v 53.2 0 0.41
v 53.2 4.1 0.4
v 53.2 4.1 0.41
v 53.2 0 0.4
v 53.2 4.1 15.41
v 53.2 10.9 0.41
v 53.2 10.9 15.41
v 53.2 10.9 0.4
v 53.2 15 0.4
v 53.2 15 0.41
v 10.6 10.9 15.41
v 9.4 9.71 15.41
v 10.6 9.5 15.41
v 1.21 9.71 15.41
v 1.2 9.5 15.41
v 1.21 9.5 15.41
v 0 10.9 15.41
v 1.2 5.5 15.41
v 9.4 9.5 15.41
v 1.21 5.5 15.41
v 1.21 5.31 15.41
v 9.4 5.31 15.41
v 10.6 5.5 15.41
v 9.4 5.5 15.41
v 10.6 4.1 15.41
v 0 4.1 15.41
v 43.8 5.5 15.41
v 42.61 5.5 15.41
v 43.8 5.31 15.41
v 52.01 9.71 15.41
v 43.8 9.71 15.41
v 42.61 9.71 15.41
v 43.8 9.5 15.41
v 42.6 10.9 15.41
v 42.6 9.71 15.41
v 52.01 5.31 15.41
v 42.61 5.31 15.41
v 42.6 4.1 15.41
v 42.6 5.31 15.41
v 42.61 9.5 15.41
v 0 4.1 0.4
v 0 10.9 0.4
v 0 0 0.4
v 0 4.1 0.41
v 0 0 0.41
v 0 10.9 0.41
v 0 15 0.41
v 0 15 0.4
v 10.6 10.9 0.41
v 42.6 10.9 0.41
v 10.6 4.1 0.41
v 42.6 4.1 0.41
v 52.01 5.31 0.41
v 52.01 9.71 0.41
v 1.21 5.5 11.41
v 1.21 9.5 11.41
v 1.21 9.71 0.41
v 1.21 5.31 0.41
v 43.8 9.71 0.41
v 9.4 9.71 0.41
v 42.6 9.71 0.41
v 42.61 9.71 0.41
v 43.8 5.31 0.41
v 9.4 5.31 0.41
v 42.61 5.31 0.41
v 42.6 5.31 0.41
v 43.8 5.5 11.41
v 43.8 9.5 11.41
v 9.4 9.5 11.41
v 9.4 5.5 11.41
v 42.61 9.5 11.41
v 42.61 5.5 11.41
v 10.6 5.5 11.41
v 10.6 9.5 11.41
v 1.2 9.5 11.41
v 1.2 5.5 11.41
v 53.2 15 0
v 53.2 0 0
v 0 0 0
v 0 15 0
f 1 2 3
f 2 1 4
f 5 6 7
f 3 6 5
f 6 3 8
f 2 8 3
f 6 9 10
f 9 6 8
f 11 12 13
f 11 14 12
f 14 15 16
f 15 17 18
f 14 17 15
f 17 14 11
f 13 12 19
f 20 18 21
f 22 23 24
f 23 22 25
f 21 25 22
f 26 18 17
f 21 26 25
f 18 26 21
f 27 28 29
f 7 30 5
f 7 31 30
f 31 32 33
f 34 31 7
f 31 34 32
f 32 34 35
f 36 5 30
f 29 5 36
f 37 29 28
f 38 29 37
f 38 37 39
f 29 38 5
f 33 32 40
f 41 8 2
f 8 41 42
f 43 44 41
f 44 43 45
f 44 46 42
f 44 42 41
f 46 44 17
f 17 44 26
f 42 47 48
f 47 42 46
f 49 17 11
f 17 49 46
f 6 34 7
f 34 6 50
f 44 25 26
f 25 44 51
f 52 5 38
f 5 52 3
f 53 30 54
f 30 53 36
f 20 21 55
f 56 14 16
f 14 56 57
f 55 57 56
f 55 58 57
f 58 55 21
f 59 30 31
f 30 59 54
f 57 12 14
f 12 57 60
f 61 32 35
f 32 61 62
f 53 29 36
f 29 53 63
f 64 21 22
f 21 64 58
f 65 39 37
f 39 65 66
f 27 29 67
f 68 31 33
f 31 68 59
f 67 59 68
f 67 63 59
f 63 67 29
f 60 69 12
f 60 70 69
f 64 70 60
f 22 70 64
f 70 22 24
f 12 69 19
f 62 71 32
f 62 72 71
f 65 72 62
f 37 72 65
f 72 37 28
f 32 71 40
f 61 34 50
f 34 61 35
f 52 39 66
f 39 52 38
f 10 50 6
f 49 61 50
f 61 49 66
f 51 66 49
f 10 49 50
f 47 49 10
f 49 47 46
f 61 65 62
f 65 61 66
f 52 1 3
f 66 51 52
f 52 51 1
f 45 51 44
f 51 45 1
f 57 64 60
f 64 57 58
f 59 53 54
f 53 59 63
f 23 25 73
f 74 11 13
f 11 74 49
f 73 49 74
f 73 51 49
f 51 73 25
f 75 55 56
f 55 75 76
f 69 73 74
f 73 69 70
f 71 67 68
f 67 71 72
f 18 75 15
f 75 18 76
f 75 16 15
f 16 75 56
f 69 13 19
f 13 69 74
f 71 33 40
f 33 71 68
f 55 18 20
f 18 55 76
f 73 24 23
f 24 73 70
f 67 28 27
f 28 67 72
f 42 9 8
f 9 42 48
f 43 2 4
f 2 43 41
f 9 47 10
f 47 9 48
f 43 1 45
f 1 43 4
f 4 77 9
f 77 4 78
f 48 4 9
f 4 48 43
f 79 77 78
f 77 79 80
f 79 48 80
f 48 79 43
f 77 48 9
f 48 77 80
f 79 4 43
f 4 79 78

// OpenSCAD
// file: ../../Base/PlacementOptions.scad
// Fischertechnik Box Foundation
// Placement Options

// Alignment
NoAlign = 0;
AlignLeft = 1;
AlignBottom = 2;
AlignCenter = 3;
AlignRight = 4;
AlignTop = 5;

// Element rotation degree steps
rotations = [0, -90, -180, -270];

// Rotation
NoRotation = 0;
Rotate0 = 0;
Rotate90 = 1;
Rotate180 = 2;
Rotate270 = 3;

// Docking (seen from above)
NoDock = -1;
DockLeft = 0;
DockTop = 1;
DockRight = 2;
DockCorner = 2;
DockBottom = 3;

// Web corners
LowerLeft = 0;
UpperLeft = 1;
UpperRight = 2;
LowerRight = 3;

// Web position relative to corner
LeftOfCorner = 0;
RightOfCorner = 1;
// file: ../../Base/Boxes.scad
// Fischertechnik Box Foundation
// Pre-designed Boxes

use <Constants.scad>

include <PlacementOptions.scad>

box190Width = 190;
box190Depth = 130;
box130Width = 130;
box130Depth = 95;

// Values are from an original ec3 box
topBottomDifference = 1.5;
outerHeight = 40;
baseThickness = 1.8;
innerHeight = outerHeight - baseThickness;
stackExcess = 5.7;
radius = 3.5;
wallThickness = 1.5;
tolerance = 0.2;

boxWallThickness = wallThickness;
boxBaseThickness = baseThickness;
boxWebWidth = 3.0;

// getBoxWallThickness()
// Gets the wall thickness of a Fischertechnik Box
function getBoxWallThickness() = boxWallThickness;

// getBoxUsageHeight(height = 38.2)
// Gets the usable height of a Fischertechnik box
// height = Outer height of the box from the bottom to the upper edge.
function getBoxUsageHeight(height = outerHeight) = height - baseThickness - stackExcess;

// getBoxInnerHeight()
// Gets the inner height of a Fischertechnik box, including the stack excess
function getBoxInnerHeight() = innerHeight;

// getBoxBaseThickness()
// Gets the thickness of the Fischertechnik box base.
function getBoxBaseThickness() = boxBaseThickness;

// getBoxWebWidth()
// Gets the width of a box web
function getBoxWebWidth() = boxWebWidth;

// getBox190Space()
// Gets the usable inner space of a Box 190 as an x/y-list
function getBox190Space() = [
    box190Width - 2*getBoxWallThickness() - topBottomDifference, 
    box190Depth - 2*getBoxWallThickness() - topBottomDifference ];

// RoundedCornerPlate(width, depth, height, radius)
// Creates a body plate with rounded corners for a box. Used
// also to create the complete box with the hull module.
// width = Width of the plate
// depth = depth of the plate 
// height = thickness of the plate
// radius = radius of the rounded corner
module RoundedCornerPlate(width, depth, height, radius) {
    translate([radius, radius])
    hull() {
        w = width-2*radius;
        d = depth-2*radius;
        cube([w, d, height]);
        cylinder(height, r=radius, $fn=getFragments());
        translate([w, 0])
            cylinder(height, r=radius, $fn=getFragments());
        translate([w, d])
            cylinder(height, r=radius, $fn=getFragments());
        translate([0, d])
            cylinder(height, r=radius, $fn=getFragments());
    }
}

// BoxBase(width, depth)
// Creates an empty stackable Fischertechnik compatible box
// width = Outer width of the box (190, 130, ...)
// depth = Outer depth of the box (130, 95, ...)

module BoxBase(width, depth, height=outerHeight) {    
    thinPlate = 0.01;

    innerHeight = height - baseThickness;    
    
    module Body(tolerance=tolerance) {
        hull() {
            // Bottom with tolerance to fit into the original boxes when stacked
            translate([-wallThickness+tolerance, -wallThickness+tolerance, -baseThickness])
                RoundedCornerPlate(width-topBottomDifference-2*tolerance, depth-topBottomDifference-2*tolerance, thinPlate, radius);
            
            // Top
            translate([-wallThickness-topBottomDifference/2, -wallThickness-topBottomDifference/2, innerHeight-thinPlate])
                RoundedCornerPlate(width, depth, thinPlate, radius);
         }
    }

    module Cutoff() {
        hull() {
            coWidth = width - 2*wallThickness;
            coDepth = depth - 2*wallThickness;
            
            // Bottom
            RoundedCornerPlate(coWidth-topBottomDifference, coDepth-topBottomDifference, thinPlate, radius);

            // Top
            translate([-topBottomDifference/2, -topBottomDifference/2, innerHeight+thinPlate]) 
                RoundedCornerPlate(coWidth, coDepth, thinPlate, radius);
        }
    }
    
    difference() {        
        Body();
        Cutoff();
        stackOffset = innerHeight - stackExcess;
        translate([0, 0, stackOffset + baseThickness])
            Body(tolerance=0);
    }
}

// Creates the Fischertechnik empty box 130x190 mm and places it at position 0,0
// 190x130 are the outer sizes, the inner space is slightly smaller. Use getBox190Space() to get the inner sizes.
// The box is positioned that the usable inner space is at the 0,0,0 position.

module Box190() {
    BoxBase(box190Width, box190Depth);
}

// Gets the usable inner space of a Box 130 as an x/y-list
function getBox130Space() = [
    box130Width - 2*getBoxWallThickness() - topBottomDifference, 
    box130Depth - 2*getBoxWallThickness() - topBottomDifference ];

// Creates the Fischertechnik empty box 95x130 mm and places it at position 0,0
// 190x130 are the outer sizes, the inner space is slightly smaller. Use getBox190Space() to get the inner sizes.
// The box is positioned that the usable inner space is at the 0,0,0 position.

module Box130() {
    BoxBase(box130Width, box130Depth);
}

// Creates a web at the specified box walls
// corner 0 = LowerLeft, 1 = UpperLeft, 2 = UpperRight, 3 = LowerRight
// side 0 = LeftOfCorner, 1 = RightOfCorner
// distance = Distance in mm from the corner
// boxSpace = inner width and depth of the box (default: Box 190)
// webWidth = length of the web (default is 3 mms)
// webThickness = thickness of the web (default is 1 mm)
// height = Height of the web (standard is getBoxUsageHeight())

module BoxWeb(corner, side, distance, boxSpace=getBox190Space(), webWidth=getBoxWebWidth(), webThickness=1.0, height=getBoxUsageHeight()) {
    sink = getBoxWallThickness()/2;

    width = (corner % 2 == 0) ? 
            (side == LeftOfCorner ? webWidth : webThickness) :
            (side == LeftOfCorner ? webThickness : webWidth);

    depth = (corner % 2 == 0) ? 
            (side == RightOfCorner ? webWidth : webThickness) :
            (side == RightOfCorner ? webThickness : webWidth);
    
    xDiff = corner == LowerLeft ? 
                (side == LeftOfCorner ? -sink : distance) :
            (corner == UpperLeft ?                
                (side == LeftOfCorner ? distance : -sink) :
            (corner == UpperRight ?
                (side == LeftOfCorner ? boxSpace.x-webWidth+sink : boxSpace.x-distance-webThickness) :
                (side == LeftOfCorner ? boxSpace.x-distance-webThickness: boxSpace.x-webWidth+sink)));

    yDiff = corner == LowerLeft ? 
                (side == RightOfCorner ? -sink : distance) :
            (corner == UpperLeft ?
                (side == RightOfCorner ? boxSpace.y-distance-webThickness : boxSpace.y-webWidth+sink) :
            (corner == UpperRight ?
                (side == RightOfCorner ? boxSpace.y-webWidth+sink : boxSpace.y-distance-webThickness) :
                (side == RightOfCorner ? distance : -sink)));
    
    translate([xDiff, yDiff, -getExcess()])
        cube([width, depth, height + 2*getExcess()]);
}
// file: ../../Base/Rotation.scad
// Fischertechnik Box Foundation
// Geometry Helpers Rotation

include <PlacementOptions.scad>

// getRotatedSpace(space, rotation=NoRotation)
// Rotates the space dependent on the specified rotation

function getRotatedSpace(space, rotation=NoRotation) = [
    (rotation == Rotate90 || rotation == Rotate270) ? space.y : space.x,
    (rotation == Rotate90 || rotation == Rotate270) ? space.x : space.y
];

// Rotates the given space around the fixed left lower corner
// space = the space the children needs as width/depth list [width,depth]
// rotation = 0 Rotate0 degrees, 1 Rotate90 degrees, 2 Rotate180 degrees, 3 Rotate270 degrees (equivalent to -90)

module RotateFix(space, rotation=NoRotation) {
    dy = (rotation == Rotate0 || rotation == Rotate270) ? 0 :
        (rotation == Rotate90) ? space.x :
        space.y;
    dx = (rotation < Rotate180) ? 0 :
        (rotation == Rotate180) ? space.x :
        space.y;
    
    translate([dx, dy, 0])
        rotate([0, 0, rotations[rotation]])
            children();
}
// file: ../../Base/Alignment.scad
// Fischertechnik Box Foundation
// Geometry Helpers Alignment

include <PlacementOptions.scad>

// getAlignedX(elementWidth, spaceWidth, align=AlignRight, offset=0)
// Gets the aligned X offset of an element with the given
// width in the given space.
// elementWidth = The width of the element to positon
// spaceWidth = The space where the element should be aligned
// align = 0 AlignLeft, 1 AlignCenter, 2 AlignRight
// offset = an optional offset from the aligned position. When
// aligned left or centered, then positive values are in X direction.
// When aligned right then positive values are in negative X direction.

function getAlignedX(elementWidth, spaceWidth, align=AlignRight, offset=0) =
    (align == AlignLeft) ?
        offset :
        ((align == AlignCenter) ?
        (spaceWidth - elementWidth)/2 + offset :
        spaceWidth - offset - elementWidth);

// getAlignedY(elementDepth, spaceDepth, align=AlignTop, offset=0)
// Gets the aligned Y offset of an element with the given
// depth in the given space.
// elementDepth = The depth of the element to positon
// spaceDepth = The space where the element should be aligned
// align = 0 AlignBottom, 1 AlignCenter, 2 AlignTop
// offset = an optional offset from the aligned position. When
// aligned bottom or centered, then positive values are in Y direction.
// When aligned top then positive values are in negative Y direction.

function getAlignedY(elementDepth, spaceDepth, align=AlignTop, offset=0) =
    (align == AlignBottom) ?
        offset :
        ((align == AlignCenter) ?
        (spaceDepth - elementDepth)/2 + offset :
        spaceDepth - offset - elementDepth);
// file: ../../Elements/FrameAxis50.scad
// Fischertechnik Box Library
// Frame for single 50 mm Axis
// 31033

use <../ModelBase/Complex.scad>

length = 50;

// getFrameAxis50Space()
// Gets the width (.x) and depth (.y) of the axis frame.

function getFrameAxis50Space() = getFrameAxisSpace(length);

// FrameAxis50()
// Axis holder for a single 50 mm axis.

module FrameAxis50() {
    FrameAxis(length);
}

// Test
color("lightgray")
FrameAxis50();
// file: ../../Base/Placement.scad
// Fischertechnik Box Foundation
// Geometry Helpers Placement

use <Constants.scad>
use <Alignment.scad>
use <Rotation.scad>
use <Boxes.scad>

include <PlacementOptions.scad>

// Place(x=0, y=0, elementSpace=[0,0], alignX=AlignLeft, alignY=AlignBottom, rotation=Rotate0, boxSpace=getBox190Space())
// Places the child at the specified position
// y = Y-Position. This is a relative position when an X aligment is specified.
// x = X-Position. This is a relative position when an Y aligment is specified.
// elementSpace = space of the element to be placed [x,y]
// alignX = -1=NoAlign, 0 AlignLeft, 1 AlignCenter, 3 AlignRight (elementSpace and boxSpace required!)
// alignY = -1=NoAlign, 2 AlignBottom, 1 AlignCenter, 4 AlignTop (elementSpace and boxSpace required!)
// rotation = 0 Rotate0 0 degrees, 1 Rotate90 90 degrees, 
// 2 Rotate180 180 degrees, 3 Rotate270 270 degrees (equivalent to -90)
// boxSpace = Inner space of the box where the placement occurs [x,y] - default is Box 190x130 inner space

module Place(x=0, y=0, elementSpace=[0,0], 
  alignX=AlignLeft, alignY=AlignBottom, 
  rotation=NoRotation, boxSpace=getBox190Space()) {

    module Position(x, y, space, rotation=Rotate0) {
        translate([x, y, 0])
            RotateFix(space, rotation)
                children();
    }

    space = getRotatedSpace(elementSpace, rotation);
    alignedX = getAlignedX(space.x, boxSpace.x, alignX, x);
    alignedY = getAlignedY(space.y, boxSpace.y, alignY, y);
    Position(alignedX, alignedY, elementSpace, rotation)
        children();
}

// Center(space=getBox130Space(), elementSpace=[0,0])
// space = Space where the children is centered. For cylinder use centered=true and no elementSpace.
// elementSpace = space of the element to be centered [x,y]

module Center(space=getBox190Space(), elementSpace=[0,0]) {
    Place(elementSpace=elementSpace, boxSpace=space, alignX=AlignCenter, alignY=AlignCenter)
        children();
}

// CenterHorizontal(width=0, y=0, offset=0, space=getBox130Space())
// width = Width of the element to be placed.
// y = Y position of the element
// offset = Offset from the center position (negative will be left of the center)
// space = Space where the element is placed

module CenterHorizontal(width=0, y=0, offset=0, space=getBox190Space()) {
    Place(x=offset, y=y, elementSpace=[width, 0], boxSpace=space, alignX=AlignCenter)
        children(0);
}

// CenterVertical(depth=0, x=0, offset=0, space=getBox130Space())
// depth = Depth of the element to be placed.
// x = X position of the element
// offset = Offset from the center position (negative will be down of the center)
// space = Space where the element is placed

module CenterVertical(depth=0, x=0, offset=0, space=getBox190Space()) {
    Place(x=x, y=offset, elementSpace=[0, depth], boxSpace=space, alignY=AlignCenter)
        children(0);
}

// getIsVertical(align)
// True if the specified alignment needs a vertical orientation for a divider (AlignRight, AlignLeft)

function getIsVertical(align) = (align == AlignRight || align == AlignLeft);

// getIsHorizontal(align)
// True if the specified alignment needs a horizontal orientation for a divider (AlignTop, AlignBottom)

function getIsHorizontal(align) = (align == AlignTop || align == AlignBottom);
// file: ../../Elements/AxisClip10.scad
// Fischertechnik Box Library
// Axis for clip 10
// 31023

use <../ModelBase/Simple.scad>
use <../Base/Constants.scad>

/* [Element Parameters] */
height = 23;
clipHeight = 10;

/* [Hidden] */
width = 12;
depth = 12;
upperDiameter = 3.6;

// getAxisClip10Space()
// Gets the space of a n axis for a clip 10 with spring ring (mot2)

function getAxisClip10Space() = [width, depth, height];

// AxisClip10(height, clipHeight)
// Axis for clip 10 with spring ring (mot2)
// height = Height of the complete axis (standard is 23, in mot3 its only 12)
// clipHeight = Height of the part for the clip (standard is 10, in mot3 its only 7)

module AxisClip10(height=height, clipHeight=clipHeight) {
    LeveledAxisWithSpace(height, height-clipHeight, getAxisClip10Space(), diameter=upperDiameter);
}

// Test
color("lightgray")
AxisClip10(height, clipHeight);
// file: ../../Base/Constants.scad
// Fischertechnik Box Foundation
// Constants

// Constant values necessary for multiple elements

// Base constants
dividerThickness = 1.2;
excess = 0.01;
fragments = 90;
tolerance = 0.8;

// Gets the thickness of a divider 
function getDividerThickness() = dividerThickness;

// Gets the excess that is used to merge walls into each other
function getExcess() = excess;

// Gets amount of fragments of a cylinder
function getFragments() = fragments;

// Gets the inner tolerance of a frame to each side
function getTolerance() = tolerance;


// Fischertechnik specific constants
axisDiameter = 4;
axisBottomDiameter = axisDiameter + 1;
axisTolerance = 0.2;

// Gets axis diameter of Fischertechnik axis
function getAxisDiameter() = axisDiameter;

// Gets axis diameter tolerance (subtracted for element axis)
function getAxisTolerance() = axisTolerance;

// Gets the axis diameter for standing axis
function getStandAxisDiameter() = getAxisDiameter() - getAxisTolerance();

// Gets axis bottom diameter for thicker part at the bottom
function getAxisBottomDiameter() = axisBottomDiameter;

standardEdgeDistance = 2.5;
standardWebDistance = 11.5;
standardCornerLength = 15;

// gets the standard distance to the wall of the box for dockable frames with webs
function getStandardEdgeDistance() = standardEdgeDistance;

// gets the standard distance of each web to the corner of the dockable frame
function getStandardWebDistance() = standardWebDistance;

// gets the standard length of the corner walls of a dockable frame
function getStandardCornerLength() = standardCornerLength;

tubeWallFactor = 0.8;

// gets the wall thickness of a tube.
function getTubeWallThickness() = tubeWallFactor * getDividerThickness();

smallPartsFrameHeight = 20;

// gets the frame height for docked small parts boxes.
function getSmallPartsFrameHeight() = smallPartsFrameHeight;

hubRingDiameter = 19.5;
hubRingLevelDiameter = 21;

// gets the diameter of a tube matching the inner ring of a wheel
function getHubRingDiameter() = hubRingDiameter;

// gets the diameter of a hub tube with a thicker diameter
function getHubRingLevelDiameter() = hubRingLevelDiameter;
// file: ../../Elements/FrameAxis50WithGearwheelZ28.scad
// Fischertechnik Box Library
// Frame for 50 mm Axis with gear wheel 28
// 185849

use <../Base/Placement.scad>
use <../ModelBase/Simple.scad>
use <FrameAxis50.scad>

/* [Hidden] */
depth = 15;

// getFrameAxis50WithGearwheelZ28Space()
// Gets the width (.x) and depth (.y) of the axis frame.

function getFrameAxis50WithGearwheelZ28Space() = 
[
    getFrameAxis50Space().x,
    depth
];

// FrameAxis50WithGearwheelZ28()
// Axis holder for a 50 mm axis with gear wheel Z28.

module FrameAxis50WithGearwheelZ28() {
    Space(getFrameAxis50WithGearwheelZ28Space());
    CenterVertical(depth=getFrameAxis50Space().y, space=getFrameAxis50WithGearwheelZ28Space())
        FrameAxis50();
}

// Test
color("lightgray")
FrameAxis50WithGearwheelZ28();
// file: ../TestPrint.scad
// 3D Print Test Base

use <../Base/Constants.scad>

use <../Elements/AxisClip10.scad>

module TestPrint(elementSpace) {
    cube([elementSpace.x, elementSpace.y, 0.4]);
    translate([0,0,0.4+getExcess()]) {
        children();
    }
}

TestPrint(getAxisClip10Space())
    AxisClip10();
// main file
// 3D Print Test
// FrameAxis50WithGearwheelZ28

use <../TestPrint.scad>
use <../../Elements/FrameAxis50WithGearwheelZ28.scad>

TestPrint(getFrameAxis50WithGearwheelZ28Space())
    FrameAxis50WithGearwheelZ28();
